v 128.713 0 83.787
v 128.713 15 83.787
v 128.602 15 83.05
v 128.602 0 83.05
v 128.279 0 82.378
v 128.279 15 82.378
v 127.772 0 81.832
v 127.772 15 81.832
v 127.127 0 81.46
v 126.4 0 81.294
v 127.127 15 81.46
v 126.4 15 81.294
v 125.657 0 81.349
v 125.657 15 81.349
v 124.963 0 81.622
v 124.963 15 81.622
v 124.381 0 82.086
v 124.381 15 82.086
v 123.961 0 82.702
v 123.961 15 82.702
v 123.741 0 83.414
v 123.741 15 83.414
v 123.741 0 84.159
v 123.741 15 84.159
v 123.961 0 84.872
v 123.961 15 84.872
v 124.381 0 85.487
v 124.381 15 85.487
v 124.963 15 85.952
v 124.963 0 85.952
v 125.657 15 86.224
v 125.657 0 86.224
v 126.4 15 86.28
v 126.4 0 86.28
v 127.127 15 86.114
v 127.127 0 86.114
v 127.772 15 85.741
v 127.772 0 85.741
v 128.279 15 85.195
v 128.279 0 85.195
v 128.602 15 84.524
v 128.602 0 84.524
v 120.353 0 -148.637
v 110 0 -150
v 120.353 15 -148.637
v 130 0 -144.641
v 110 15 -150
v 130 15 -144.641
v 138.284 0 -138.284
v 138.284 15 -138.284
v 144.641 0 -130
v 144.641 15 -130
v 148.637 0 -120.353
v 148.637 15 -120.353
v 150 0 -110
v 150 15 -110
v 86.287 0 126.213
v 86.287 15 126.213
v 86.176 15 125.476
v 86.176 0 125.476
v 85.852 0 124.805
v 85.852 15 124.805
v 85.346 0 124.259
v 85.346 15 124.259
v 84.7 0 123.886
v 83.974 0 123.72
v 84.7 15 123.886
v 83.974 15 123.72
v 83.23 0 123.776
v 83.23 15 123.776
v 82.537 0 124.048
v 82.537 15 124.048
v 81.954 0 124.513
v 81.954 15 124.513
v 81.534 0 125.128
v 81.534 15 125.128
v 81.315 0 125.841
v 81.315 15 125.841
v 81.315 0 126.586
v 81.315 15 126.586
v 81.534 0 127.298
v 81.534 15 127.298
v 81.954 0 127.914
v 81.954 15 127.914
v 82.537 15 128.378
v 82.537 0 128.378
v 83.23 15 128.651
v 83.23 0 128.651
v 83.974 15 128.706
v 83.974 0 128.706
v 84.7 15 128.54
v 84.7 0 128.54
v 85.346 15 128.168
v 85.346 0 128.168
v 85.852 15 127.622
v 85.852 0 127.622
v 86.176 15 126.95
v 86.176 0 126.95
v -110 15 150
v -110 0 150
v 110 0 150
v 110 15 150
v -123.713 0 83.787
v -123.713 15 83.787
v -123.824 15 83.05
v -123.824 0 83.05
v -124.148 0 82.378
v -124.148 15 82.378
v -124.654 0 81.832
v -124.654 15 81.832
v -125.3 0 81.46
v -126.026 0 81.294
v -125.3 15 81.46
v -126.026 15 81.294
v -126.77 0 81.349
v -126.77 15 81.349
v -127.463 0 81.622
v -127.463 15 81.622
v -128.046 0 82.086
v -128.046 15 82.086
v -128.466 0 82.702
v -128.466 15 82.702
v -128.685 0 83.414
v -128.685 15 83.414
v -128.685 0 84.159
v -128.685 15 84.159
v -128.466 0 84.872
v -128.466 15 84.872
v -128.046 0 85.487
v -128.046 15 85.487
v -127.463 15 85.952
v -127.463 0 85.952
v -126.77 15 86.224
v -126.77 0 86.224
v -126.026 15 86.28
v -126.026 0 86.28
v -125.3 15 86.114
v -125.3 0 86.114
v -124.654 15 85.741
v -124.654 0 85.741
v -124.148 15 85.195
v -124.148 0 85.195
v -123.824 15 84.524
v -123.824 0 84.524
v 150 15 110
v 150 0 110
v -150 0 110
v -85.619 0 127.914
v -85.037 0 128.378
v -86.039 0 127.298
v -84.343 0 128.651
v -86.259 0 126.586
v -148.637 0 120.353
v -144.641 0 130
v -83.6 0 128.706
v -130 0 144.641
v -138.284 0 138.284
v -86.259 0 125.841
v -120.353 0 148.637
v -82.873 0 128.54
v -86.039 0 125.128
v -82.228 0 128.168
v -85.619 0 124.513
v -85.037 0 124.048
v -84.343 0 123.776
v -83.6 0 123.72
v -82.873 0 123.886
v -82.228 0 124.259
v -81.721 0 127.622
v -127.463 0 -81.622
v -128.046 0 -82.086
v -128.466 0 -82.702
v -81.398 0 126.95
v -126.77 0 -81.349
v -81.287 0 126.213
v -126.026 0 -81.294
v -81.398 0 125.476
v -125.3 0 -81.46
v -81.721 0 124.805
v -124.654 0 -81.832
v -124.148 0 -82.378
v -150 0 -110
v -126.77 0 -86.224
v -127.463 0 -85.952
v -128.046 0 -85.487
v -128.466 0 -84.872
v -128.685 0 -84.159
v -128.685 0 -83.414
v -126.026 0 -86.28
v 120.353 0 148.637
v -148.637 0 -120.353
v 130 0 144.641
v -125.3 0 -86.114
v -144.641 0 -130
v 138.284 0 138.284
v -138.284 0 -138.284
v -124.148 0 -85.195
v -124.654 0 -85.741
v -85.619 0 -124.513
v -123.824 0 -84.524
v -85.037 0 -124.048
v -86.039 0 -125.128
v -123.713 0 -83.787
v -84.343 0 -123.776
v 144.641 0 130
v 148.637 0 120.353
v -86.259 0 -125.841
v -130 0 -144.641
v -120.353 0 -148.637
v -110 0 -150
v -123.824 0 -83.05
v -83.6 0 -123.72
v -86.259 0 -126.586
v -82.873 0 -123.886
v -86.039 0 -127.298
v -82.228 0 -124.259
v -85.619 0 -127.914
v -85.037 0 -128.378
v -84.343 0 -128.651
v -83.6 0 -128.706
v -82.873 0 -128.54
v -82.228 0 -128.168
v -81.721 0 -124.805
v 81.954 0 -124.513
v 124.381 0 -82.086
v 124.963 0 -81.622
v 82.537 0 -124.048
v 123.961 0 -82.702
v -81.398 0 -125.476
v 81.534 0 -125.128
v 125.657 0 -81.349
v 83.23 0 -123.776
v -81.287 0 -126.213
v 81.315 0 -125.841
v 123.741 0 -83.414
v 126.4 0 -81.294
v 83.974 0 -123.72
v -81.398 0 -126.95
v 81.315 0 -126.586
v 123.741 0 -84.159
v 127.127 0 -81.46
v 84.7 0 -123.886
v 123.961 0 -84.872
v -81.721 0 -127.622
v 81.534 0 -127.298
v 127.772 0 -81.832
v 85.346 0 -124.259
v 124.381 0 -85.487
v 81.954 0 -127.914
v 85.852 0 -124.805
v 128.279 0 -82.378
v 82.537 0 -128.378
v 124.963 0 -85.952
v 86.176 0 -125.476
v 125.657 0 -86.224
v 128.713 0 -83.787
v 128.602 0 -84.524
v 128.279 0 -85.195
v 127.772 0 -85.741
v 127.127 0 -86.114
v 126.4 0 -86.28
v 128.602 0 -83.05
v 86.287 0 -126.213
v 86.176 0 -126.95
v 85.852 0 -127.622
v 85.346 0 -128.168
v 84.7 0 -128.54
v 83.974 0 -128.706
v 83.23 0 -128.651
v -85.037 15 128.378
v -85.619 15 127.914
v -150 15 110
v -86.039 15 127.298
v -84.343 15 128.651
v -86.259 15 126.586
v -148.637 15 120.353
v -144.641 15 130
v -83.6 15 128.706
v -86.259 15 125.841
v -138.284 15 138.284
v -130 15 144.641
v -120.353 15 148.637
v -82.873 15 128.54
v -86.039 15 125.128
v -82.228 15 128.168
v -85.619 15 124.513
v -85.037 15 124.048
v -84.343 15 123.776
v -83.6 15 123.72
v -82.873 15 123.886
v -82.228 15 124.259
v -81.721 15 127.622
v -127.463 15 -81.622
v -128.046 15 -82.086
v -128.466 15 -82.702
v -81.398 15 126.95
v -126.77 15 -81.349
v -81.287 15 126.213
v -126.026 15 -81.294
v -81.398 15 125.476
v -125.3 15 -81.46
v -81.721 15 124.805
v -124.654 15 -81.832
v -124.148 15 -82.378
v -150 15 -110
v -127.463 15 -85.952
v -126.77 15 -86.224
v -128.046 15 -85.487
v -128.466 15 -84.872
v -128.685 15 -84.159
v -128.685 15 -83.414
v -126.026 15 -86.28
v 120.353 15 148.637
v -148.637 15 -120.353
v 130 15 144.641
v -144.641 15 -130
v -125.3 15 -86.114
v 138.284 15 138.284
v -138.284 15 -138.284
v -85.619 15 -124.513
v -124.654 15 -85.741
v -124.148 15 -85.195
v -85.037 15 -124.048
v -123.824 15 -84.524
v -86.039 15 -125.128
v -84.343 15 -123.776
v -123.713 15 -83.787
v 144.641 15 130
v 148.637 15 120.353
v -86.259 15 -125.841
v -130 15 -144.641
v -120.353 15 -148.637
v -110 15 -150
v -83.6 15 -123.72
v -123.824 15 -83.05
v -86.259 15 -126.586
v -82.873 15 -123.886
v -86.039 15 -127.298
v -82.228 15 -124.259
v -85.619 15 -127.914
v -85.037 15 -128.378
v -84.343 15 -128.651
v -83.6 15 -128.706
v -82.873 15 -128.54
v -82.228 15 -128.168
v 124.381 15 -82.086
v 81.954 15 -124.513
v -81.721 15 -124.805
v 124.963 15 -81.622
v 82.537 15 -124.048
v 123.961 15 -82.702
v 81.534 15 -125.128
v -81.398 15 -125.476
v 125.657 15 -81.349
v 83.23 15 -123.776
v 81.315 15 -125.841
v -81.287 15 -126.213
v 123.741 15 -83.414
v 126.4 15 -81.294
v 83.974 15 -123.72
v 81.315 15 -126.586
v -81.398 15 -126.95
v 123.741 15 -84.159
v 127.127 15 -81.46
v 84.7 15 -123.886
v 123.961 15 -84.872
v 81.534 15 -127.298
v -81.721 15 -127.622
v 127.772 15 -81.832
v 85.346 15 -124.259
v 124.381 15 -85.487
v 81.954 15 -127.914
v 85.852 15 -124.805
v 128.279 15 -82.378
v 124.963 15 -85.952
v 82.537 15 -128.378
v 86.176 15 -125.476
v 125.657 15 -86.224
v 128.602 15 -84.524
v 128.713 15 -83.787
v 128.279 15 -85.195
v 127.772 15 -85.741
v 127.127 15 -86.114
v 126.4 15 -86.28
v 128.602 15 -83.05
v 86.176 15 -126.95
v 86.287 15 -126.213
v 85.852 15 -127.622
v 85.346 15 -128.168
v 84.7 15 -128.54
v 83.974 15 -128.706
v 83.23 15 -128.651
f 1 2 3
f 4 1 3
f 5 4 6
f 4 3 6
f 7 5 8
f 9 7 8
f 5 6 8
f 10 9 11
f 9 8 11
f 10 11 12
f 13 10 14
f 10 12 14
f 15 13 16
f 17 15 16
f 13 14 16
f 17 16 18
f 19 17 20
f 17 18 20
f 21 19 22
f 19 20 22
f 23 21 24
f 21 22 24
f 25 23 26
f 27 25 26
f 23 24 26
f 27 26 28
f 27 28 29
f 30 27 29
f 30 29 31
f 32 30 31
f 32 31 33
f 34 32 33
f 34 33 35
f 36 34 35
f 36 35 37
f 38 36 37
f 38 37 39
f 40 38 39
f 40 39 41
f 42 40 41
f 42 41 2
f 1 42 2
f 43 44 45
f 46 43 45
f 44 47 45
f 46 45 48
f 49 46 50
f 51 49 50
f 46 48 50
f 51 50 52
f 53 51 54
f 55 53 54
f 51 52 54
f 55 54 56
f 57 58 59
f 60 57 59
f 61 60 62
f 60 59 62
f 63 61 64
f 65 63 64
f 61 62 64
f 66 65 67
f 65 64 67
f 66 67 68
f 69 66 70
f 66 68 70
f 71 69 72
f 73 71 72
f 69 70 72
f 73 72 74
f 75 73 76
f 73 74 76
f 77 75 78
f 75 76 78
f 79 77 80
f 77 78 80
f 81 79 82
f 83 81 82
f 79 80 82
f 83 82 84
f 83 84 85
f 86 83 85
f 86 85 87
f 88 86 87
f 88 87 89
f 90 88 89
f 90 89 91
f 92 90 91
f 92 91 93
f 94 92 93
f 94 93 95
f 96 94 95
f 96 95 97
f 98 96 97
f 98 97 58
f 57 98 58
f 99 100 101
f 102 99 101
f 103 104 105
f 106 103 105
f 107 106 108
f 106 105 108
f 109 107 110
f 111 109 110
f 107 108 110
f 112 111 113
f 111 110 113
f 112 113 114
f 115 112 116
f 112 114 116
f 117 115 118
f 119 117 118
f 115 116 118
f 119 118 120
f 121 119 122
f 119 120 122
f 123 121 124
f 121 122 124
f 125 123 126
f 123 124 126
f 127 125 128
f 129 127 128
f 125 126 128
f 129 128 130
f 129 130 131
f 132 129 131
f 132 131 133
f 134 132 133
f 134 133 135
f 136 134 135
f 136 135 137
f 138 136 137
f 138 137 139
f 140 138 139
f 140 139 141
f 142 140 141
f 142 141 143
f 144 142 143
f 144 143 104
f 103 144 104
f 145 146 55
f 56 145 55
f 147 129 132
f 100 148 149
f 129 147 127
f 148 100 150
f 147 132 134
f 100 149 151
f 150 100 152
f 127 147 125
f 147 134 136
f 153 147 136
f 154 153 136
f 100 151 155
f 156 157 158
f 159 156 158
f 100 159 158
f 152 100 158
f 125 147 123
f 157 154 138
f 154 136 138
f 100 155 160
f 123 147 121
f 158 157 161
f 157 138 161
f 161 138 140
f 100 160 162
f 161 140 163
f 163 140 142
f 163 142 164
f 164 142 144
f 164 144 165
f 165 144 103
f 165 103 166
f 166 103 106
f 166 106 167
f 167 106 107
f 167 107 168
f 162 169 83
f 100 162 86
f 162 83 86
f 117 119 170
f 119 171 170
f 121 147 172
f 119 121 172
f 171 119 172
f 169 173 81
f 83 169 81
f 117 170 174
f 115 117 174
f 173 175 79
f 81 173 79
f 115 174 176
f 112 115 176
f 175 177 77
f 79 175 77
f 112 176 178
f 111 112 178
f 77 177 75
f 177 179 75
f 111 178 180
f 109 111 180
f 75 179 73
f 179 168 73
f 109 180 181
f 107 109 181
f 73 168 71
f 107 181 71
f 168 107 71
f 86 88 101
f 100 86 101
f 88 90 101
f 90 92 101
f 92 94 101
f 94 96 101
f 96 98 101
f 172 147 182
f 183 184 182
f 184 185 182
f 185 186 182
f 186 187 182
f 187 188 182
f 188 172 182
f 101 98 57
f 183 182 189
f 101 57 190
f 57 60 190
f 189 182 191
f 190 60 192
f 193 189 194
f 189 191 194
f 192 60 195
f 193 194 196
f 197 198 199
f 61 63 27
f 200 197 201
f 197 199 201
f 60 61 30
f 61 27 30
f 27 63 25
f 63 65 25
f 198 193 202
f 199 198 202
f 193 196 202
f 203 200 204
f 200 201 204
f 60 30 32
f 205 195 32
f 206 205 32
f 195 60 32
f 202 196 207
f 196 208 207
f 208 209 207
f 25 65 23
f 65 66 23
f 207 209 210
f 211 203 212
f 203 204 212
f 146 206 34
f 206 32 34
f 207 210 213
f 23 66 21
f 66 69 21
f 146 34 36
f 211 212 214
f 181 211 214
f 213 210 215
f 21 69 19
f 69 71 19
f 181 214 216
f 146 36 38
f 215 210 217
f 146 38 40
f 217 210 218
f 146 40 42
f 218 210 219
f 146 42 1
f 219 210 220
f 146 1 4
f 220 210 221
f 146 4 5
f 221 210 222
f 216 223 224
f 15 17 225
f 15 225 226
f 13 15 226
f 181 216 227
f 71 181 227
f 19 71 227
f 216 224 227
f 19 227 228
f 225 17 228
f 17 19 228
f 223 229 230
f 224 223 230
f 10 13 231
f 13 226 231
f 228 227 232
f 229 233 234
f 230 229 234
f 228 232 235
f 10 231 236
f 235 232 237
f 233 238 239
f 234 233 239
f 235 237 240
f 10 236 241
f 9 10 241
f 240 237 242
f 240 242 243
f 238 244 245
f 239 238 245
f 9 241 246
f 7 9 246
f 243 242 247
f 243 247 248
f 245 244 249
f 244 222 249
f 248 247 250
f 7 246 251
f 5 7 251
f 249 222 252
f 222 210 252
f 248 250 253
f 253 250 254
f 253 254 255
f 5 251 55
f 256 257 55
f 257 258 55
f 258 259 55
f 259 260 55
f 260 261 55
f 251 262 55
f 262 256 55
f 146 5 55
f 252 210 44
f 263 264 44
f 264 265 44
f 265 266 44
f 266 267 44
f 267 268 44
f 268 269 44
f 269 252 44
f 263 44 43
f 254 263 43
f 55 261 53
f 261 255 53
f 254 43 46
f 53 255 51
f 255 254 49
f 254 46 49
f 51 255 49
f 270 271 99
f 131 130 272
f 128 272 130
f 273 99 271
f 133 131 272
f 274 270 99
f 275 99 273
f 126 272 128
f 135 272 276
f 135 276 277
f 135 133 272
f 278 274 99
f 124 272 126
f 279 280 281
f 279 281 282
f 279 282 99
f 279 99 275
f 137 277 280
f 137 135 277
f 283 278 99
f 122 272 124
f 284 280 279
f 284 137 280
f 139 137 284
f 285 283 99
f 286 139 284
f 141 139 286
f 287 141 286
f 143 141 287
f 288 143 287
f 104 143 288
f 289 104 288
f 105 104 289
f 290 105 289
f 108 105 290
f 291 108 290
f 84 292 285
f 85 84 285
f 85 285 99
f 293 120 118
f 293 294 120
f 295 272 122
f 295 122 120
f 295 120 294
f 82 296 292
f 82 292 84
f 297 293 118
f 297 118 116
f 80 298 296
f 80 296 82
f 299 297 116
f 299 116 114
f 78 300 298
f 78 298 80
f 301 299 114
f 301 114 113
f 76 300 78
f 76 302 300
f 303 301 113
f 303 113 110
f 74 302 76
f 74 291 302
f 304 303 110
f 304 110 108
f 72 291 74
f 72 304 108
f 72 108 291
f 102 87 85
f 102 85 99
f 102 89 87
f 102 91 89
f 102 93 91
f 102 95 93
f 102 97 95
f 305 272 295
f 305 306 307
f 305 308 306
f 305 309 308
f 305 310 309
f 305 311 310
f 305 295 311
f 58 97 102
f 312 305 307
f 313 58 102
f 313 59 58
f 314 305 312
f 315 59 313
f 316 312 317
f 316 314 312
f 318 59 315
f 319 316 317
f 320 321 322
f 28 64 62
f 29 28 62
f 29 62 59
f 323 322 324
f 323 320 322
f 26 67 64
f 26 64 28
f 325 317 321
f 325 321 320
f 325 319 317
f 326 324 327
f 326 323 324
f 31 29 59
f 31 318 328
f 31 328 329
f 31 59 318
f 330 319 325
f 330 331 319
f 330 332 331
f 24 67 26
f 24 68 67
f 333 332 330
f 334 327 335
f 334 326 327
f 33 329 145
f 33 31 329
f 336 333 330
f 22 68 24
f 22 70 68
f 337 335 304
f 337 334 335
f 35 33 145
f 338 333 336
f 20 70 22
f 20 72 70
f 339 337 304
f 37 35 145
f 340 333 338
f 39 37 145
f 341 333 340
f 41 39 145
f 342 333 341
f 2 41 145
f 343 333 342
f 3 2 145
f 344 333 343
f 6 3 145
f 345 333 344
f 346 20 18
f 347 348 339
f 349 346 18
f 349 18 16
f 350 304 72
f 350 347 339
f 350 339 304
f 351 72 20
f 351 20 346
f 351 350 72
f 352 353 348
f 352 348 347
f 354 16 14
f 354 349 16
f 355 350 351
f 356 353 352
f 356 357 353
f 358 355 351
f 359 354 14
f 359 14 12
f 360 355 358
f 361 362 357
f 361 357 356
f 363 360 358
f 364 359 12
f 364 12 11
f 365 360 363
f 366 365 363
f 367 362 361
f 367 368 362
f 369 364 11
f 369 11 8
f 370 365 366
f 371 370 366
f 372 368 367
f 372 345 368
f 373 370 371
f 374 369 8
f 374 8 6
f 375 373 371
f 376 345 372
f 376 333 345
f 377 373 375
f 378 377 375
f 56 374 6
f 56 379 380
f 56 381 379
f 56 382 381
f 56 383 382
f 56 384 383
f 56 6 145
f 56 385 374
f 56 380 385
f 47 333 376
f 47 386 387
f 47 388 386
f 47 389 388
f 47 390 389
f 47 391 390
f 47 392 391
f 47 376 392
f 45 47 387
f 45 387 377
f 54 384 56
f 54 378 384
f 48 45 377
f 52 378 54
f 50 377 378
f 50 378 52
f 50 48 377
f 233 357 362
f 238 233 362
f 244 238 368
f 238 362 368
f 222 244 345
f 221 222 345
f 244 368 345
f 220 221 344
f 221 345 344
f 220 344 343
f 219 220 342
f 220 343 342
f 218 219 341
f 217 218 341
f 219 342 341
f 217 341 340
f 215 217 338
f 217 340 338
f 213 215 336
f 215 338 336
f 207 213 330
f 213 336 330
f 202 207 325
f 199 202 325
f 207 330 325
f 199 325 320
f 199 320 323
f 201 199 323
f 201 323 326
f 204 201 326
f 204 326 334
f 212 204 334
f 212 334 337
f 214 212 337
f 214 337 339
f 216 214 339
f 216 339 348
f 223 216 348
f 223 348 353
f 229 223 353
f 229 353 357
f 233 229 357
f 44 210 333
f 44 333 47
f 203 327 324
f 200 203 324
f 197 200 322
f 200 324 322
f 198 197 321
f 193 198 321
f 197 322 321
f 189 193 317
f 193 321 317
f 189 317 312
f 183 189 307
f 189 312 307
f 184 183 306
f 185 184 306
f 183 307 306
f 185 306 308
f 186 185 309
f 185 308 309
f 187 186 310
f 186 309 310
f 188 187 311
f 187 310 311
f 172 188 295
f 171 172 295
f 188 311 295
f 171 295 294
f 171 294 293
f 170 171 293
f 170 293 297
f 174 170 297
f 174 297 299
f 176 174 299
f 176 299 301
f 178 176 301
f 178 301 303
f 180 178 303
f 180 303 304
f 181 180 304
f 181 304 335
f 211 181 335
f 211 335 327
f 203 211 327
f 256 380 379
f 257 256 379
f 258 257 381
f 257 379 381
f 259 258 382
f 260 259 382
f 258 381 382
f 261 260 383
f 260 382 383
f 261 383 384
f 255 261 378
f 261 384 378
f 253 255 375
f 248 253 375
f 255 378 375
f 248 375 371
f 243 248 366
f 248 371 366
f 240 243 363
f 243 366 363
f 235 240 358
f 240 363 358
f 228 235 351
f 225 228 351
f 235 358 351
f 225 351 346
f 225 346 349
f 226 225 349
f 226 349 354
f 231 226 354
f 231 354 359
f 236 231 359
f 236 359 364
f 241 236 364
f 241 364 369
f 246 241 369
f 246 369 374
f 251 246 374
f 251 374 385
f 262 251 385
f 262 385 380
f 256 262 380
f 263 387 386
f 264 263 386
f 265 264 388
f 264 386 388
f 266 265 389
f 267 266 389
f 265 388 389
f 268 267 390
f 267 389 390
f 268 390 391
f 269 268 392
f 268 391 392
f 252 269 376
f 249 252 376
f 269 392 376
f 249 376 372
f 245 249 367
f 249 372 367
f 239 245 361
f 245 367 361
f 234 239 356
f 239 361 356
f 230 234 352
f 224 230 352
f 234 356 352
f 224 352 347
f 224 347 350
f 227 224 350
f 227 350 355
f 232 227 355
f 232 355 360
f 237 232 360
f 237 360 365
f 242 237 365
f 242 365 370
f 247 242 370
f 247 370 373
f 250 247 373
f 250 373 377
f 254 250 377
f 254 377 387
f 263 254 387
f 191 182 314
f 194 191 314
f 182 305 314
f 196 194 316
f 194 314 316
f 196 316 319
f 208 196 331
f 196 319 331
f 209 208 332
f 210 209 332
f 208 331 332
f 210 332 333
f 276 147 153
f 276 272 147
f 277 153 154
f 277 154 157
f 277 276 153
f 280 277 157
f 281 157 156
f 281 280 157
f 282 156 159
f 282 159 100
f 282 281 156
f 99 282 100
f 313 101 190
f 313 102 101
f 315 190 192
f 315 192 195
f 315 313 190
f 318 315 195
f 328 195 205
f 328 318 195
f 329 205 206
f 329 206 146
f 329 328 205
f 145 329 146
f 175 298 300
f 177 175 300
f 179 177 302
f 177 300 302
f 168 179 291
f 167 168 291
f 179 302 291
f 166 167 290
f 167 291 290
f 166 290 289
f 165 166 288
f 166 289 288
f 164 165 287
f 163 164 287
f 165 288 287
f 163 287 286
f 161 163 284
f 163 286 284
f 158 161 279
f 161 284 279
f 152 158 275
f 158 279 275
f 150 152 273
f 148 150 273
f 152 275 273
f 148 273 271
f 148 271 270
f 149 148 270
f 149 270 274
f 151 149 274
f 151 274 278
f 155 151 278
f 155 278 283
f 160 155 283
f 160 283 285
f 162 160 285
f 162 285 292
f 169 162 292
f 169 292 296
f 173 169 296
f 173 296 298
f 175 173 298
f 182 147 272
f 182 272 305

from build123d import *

# Parameters (mm, degrees)
SKETCH1_W           = 300
SKETCH1_H           = 300
BOSS_EXTRUDE1_DEPTH = 15
SKETCH3_R           = 2.5
CUT_EXTRUDE1_DEPTH  = 16
FILLET1_R           = 40


with BuildPart() as part:
    # Sketch1 → Boss-Extrude1 (new body)
    with BuildSketch(Plane(origin=(0, 0, 0), x_dir=(1, 0, 0), z_dir=(0, 1, 0))):
        Rectangle(SKETCH1_W, SKETCH1_H)
    extrude(amount=BOSS_EXTRUDE1_DEPTH)

    # Sketch3 → Cut-Extrude1 (cut, through all)
    with BuildSketch(Plane(origin=(0, 15, 0), x_dir=(1, 0, 0), z_dir=(0, 1, 0))):
        with Locations((-83.786796564, 126.213203436)):
            Circle(SKETCH3_R)
        with Locations((-126.213203436, 83.786796564)):
            Circle(SKETCH3_R)
        with Locations((126.213203436, 83.786796564)):
            Circle(SKETCH3_R)
        with Locations((83.786796564, 126.213203436)):
            Circle(SKETCH3_R)
        with Locations((83.786796564, -126.213203436)):
            Circle(SKETCH3_R)
        with Locations((126.213203436, -83.786796564)):
            Circle(SKETCH3_R)
        with Locations((-126.213203436, -83.786796564)):
            Circle(SKETCH3_R)
        with Locations((-83.786796564, -126.213203436)):
            Circle(SKETCH3_R)
    extrude(amount=-CUT_EXTRUDE1_DEPTH, mode=Mode.SUBTRACT)

    # Fillet1
    fillet1_edges = [part.edges().sort_by_distance(p)[0] for p in [
        (150, 7.5, 150),
        (-150, 7.5, 150),
        (-150, 7.5, -150),
        (150, 7.5, -150),
    ]]
    fillet(fillet1_edges, radius=FILLET1_R)


solid = part.part
